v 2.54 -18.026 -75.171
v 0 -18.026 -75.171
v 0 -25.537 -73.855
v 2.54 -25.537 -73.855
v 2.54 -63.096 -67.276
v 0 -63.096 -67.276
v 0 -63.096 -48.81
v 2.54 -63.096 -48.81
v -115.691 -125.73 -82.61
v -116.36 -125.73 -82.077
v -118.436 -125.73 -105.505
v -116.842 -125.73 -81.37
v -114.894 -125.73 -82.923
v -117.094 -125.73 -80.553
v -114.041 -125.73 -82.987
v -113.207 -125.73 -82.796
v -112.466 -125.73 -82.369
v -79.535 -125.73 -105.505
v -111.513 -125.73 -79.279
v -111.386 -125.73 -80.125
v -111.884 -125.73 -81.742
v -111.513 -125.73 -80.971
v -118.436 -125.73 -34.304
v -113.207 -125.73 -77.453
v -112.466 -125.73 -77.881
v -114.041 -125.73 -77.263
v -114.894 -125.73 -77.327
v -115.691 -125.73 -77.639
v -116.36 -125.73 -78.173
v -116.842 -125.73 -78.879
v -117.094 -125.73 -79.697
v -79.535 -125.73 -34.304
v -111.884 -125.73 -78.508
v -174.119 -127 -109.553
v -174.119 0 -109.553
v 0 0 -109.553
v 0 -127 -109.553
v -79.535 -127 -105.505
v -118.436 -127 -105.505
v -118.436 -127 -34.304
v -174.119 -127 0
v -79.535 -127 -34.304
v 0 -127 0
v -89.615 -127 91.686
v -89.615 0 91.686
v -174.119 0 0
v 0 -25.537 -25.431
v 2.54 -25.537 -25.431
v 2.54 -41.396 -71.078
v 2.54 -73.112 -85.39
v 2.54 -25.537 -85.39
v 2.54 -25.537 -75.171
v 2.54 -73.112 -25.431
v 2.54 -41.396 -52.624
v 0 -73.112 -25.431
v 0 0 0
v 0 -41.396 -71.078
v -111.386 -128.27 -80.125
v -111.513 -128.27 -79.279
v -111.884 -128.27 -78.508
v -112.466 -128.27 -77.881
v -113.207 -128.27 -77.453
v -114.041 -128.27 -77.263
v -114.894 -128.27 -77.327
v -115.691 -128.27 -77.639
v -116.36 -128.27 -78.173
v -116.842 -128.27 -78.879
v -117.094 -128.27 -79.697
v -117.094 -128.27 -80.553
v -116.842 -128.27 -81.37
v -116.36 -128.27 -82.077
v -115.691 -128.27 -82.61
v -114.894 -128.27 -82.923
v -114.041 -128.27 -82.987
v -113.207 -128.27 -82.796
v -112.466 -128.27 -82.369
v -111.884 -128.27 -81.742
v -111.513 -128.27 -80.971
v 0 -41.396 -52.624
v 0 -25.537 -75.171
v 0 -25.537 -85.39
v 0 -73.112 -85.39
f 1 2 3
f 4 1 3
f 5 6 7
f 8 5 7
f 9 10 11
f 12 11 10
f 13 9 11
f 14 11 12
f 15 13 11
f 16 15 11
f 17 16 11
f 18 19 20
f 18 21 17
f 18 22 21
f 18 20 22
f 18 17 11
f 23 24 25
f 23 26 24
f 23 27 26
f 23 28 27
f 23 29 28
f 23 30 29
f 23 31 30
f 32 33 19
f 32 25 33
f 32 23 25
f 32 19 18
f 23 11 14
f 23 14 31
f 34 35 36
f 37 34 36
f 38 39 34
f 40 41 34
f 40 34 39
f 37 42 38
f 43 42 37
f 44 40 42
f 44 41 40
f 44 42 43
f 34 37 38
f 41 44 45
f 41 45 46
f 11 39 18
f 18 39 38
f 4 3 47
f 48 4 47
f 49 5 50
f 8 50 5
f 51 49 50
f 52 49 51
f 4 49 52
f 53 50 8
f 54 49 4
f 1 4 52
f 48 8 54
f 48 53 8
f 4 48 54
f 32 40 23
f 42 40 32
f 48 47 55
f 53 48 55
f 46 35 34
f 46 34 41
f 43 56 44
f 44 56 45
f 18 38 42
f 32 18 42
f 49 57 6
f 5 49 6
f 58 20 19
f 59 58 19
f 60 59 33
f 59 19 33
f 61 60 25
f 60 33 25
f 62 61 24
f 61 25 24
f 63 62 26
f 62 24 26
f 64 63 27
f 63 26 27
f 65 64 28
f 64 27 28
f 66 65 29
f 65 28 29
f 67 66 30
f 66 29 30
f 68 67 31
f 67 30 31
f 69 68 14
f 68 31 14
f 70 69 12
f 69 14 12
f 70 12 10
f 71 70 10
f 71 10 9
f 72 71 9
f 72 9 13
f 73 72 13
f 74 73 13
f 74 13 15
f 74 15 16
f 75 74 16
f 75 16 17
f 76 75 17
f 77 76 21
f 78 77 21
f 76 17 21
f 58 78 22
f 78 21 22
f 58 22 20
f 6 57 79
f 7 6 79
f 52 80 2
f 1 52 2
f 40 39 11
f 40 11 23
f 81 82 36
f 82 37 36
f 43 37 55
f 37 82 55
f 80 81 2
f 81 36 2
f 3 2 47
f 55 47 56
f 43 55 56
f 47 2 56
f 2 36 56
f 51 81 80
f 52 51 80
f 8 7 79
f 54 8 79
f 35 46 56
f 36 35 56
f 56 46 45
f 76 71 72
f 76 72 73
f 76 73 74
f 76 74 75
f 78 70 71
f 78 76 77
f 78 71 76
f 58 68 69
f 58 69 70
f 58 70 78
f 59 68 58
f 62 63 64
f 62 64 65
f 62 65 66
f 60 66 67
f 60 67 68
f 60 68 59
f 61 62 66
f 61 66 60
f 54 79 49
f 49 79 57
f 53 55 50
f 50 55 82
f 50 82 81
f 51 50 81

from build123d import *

# Parameters (mm, degrees)
F0_W     = 174.1194725037
F0_H     = 109.5531731844
F1_DEPTH = 127
F2_W     = 38.9005169272
F2_H     = 71.2012238801
F3_DEPTH = 1.27
F4_R     = 2.870090853
F5_DEPTH = 2.54
F7_DEPTH = 2.54


with BuildPart() as f1:
    # F0 (on Front) → F1 (new body)
    with BuildSketch(Plane.XZ):
        with Locations((-87.0597362518, -54.7765865922)):
            Rectangle(F0_W, F0_H)
        Polygon((-174.1194725037, 0), (0, 0), (-89.6153151989, 91.6864871979), align=None)
    extrude(amount=F1_DEPTH)

    # F2 (on face) → F3 (cut)
    with BuildSketch(Plane.XZ.offset(127)):
        with Locations((-98.9855192602, -69.9048843235)):
            Rectangle(F2_W, F2_H)
    extrude(amount=-F3_DEPTH, mode=Mode.SUBTRACT)

    # F4 (on face) → F5 (join)
    with BuildSketch(Plane.XZ.offset(125.73)):
        with Locations((-114.2556890845, -80.1247730851)):
            Circle(F4_R)
    extrude(amount=F5_DEPTH)

    # F6 (on face) → F7 (join)
    with BuildSketch(Plane.YZ):
        Polygon((-63.096486032, -25.4311673343), (-73.1122642756, -25.4311673343), (-73.1122642756, -47.0497577235), (-71.9686165237, -47.2507400464), (-63.096486032, -48.8099101597), align=None)
        Polygon((-41.3957126439, -25.4311673343), (-63.096486032, -25.4311673343), (-63.096486032, -48.8099101597), (-41.3957126439, -52.6235598049), align=None)
        Polygon((-71.9686165237, -47.2507400464), (-73.1122642756, -47.0497577235), (-73.1122642756, -65.521992743), (-63.096486032, -67.276372096), (-63.096486032, -48.8099101597), align=None)
        Polygon((-25.5374331027, -25.4311673343), (-41.3957126439, -25.4311673343), (-41.3957126439, -52.6235598049), (-25.5374331027, -55.4104615003), align=None)
        Polygon((-63.096486032, -67.276372096), (-73.1122642756, -65.521992743), (-73.1122642756, -85.3897556663), (-63.096486032, -85.3897556663), align=None)
        Polygon((-25.5374331027, -55.4104615003), (-41.3957126439, -52.6235598049), (-41.3957126439, -71.0775134402), (-25.5374331027, -73.8552744413), align=None)
        Polygon((-41.3957126439, -71.0775134402), (-63.096486032, -67.276372096), (-63.096486032, -85.3897556663), (-41.3957126439, -85.3897556663), align=None)
        Polygon((-25.5374331027, -73.8552744413), (-41.3957126439, -71.0775134402), (-41.3957126439, -85.3897556663), (-25.5374331027, -85.3897556663), (-25.5374331027, -75.1710534096), align=None)
        Polygon((-18.025631085, -75.1710534096), (-25.5374331027, -73.8552744413), (-25.5374331027, -75.1710534096), align=None)
    extrude(amount=F7_DEPTH)


solid = f1.part
